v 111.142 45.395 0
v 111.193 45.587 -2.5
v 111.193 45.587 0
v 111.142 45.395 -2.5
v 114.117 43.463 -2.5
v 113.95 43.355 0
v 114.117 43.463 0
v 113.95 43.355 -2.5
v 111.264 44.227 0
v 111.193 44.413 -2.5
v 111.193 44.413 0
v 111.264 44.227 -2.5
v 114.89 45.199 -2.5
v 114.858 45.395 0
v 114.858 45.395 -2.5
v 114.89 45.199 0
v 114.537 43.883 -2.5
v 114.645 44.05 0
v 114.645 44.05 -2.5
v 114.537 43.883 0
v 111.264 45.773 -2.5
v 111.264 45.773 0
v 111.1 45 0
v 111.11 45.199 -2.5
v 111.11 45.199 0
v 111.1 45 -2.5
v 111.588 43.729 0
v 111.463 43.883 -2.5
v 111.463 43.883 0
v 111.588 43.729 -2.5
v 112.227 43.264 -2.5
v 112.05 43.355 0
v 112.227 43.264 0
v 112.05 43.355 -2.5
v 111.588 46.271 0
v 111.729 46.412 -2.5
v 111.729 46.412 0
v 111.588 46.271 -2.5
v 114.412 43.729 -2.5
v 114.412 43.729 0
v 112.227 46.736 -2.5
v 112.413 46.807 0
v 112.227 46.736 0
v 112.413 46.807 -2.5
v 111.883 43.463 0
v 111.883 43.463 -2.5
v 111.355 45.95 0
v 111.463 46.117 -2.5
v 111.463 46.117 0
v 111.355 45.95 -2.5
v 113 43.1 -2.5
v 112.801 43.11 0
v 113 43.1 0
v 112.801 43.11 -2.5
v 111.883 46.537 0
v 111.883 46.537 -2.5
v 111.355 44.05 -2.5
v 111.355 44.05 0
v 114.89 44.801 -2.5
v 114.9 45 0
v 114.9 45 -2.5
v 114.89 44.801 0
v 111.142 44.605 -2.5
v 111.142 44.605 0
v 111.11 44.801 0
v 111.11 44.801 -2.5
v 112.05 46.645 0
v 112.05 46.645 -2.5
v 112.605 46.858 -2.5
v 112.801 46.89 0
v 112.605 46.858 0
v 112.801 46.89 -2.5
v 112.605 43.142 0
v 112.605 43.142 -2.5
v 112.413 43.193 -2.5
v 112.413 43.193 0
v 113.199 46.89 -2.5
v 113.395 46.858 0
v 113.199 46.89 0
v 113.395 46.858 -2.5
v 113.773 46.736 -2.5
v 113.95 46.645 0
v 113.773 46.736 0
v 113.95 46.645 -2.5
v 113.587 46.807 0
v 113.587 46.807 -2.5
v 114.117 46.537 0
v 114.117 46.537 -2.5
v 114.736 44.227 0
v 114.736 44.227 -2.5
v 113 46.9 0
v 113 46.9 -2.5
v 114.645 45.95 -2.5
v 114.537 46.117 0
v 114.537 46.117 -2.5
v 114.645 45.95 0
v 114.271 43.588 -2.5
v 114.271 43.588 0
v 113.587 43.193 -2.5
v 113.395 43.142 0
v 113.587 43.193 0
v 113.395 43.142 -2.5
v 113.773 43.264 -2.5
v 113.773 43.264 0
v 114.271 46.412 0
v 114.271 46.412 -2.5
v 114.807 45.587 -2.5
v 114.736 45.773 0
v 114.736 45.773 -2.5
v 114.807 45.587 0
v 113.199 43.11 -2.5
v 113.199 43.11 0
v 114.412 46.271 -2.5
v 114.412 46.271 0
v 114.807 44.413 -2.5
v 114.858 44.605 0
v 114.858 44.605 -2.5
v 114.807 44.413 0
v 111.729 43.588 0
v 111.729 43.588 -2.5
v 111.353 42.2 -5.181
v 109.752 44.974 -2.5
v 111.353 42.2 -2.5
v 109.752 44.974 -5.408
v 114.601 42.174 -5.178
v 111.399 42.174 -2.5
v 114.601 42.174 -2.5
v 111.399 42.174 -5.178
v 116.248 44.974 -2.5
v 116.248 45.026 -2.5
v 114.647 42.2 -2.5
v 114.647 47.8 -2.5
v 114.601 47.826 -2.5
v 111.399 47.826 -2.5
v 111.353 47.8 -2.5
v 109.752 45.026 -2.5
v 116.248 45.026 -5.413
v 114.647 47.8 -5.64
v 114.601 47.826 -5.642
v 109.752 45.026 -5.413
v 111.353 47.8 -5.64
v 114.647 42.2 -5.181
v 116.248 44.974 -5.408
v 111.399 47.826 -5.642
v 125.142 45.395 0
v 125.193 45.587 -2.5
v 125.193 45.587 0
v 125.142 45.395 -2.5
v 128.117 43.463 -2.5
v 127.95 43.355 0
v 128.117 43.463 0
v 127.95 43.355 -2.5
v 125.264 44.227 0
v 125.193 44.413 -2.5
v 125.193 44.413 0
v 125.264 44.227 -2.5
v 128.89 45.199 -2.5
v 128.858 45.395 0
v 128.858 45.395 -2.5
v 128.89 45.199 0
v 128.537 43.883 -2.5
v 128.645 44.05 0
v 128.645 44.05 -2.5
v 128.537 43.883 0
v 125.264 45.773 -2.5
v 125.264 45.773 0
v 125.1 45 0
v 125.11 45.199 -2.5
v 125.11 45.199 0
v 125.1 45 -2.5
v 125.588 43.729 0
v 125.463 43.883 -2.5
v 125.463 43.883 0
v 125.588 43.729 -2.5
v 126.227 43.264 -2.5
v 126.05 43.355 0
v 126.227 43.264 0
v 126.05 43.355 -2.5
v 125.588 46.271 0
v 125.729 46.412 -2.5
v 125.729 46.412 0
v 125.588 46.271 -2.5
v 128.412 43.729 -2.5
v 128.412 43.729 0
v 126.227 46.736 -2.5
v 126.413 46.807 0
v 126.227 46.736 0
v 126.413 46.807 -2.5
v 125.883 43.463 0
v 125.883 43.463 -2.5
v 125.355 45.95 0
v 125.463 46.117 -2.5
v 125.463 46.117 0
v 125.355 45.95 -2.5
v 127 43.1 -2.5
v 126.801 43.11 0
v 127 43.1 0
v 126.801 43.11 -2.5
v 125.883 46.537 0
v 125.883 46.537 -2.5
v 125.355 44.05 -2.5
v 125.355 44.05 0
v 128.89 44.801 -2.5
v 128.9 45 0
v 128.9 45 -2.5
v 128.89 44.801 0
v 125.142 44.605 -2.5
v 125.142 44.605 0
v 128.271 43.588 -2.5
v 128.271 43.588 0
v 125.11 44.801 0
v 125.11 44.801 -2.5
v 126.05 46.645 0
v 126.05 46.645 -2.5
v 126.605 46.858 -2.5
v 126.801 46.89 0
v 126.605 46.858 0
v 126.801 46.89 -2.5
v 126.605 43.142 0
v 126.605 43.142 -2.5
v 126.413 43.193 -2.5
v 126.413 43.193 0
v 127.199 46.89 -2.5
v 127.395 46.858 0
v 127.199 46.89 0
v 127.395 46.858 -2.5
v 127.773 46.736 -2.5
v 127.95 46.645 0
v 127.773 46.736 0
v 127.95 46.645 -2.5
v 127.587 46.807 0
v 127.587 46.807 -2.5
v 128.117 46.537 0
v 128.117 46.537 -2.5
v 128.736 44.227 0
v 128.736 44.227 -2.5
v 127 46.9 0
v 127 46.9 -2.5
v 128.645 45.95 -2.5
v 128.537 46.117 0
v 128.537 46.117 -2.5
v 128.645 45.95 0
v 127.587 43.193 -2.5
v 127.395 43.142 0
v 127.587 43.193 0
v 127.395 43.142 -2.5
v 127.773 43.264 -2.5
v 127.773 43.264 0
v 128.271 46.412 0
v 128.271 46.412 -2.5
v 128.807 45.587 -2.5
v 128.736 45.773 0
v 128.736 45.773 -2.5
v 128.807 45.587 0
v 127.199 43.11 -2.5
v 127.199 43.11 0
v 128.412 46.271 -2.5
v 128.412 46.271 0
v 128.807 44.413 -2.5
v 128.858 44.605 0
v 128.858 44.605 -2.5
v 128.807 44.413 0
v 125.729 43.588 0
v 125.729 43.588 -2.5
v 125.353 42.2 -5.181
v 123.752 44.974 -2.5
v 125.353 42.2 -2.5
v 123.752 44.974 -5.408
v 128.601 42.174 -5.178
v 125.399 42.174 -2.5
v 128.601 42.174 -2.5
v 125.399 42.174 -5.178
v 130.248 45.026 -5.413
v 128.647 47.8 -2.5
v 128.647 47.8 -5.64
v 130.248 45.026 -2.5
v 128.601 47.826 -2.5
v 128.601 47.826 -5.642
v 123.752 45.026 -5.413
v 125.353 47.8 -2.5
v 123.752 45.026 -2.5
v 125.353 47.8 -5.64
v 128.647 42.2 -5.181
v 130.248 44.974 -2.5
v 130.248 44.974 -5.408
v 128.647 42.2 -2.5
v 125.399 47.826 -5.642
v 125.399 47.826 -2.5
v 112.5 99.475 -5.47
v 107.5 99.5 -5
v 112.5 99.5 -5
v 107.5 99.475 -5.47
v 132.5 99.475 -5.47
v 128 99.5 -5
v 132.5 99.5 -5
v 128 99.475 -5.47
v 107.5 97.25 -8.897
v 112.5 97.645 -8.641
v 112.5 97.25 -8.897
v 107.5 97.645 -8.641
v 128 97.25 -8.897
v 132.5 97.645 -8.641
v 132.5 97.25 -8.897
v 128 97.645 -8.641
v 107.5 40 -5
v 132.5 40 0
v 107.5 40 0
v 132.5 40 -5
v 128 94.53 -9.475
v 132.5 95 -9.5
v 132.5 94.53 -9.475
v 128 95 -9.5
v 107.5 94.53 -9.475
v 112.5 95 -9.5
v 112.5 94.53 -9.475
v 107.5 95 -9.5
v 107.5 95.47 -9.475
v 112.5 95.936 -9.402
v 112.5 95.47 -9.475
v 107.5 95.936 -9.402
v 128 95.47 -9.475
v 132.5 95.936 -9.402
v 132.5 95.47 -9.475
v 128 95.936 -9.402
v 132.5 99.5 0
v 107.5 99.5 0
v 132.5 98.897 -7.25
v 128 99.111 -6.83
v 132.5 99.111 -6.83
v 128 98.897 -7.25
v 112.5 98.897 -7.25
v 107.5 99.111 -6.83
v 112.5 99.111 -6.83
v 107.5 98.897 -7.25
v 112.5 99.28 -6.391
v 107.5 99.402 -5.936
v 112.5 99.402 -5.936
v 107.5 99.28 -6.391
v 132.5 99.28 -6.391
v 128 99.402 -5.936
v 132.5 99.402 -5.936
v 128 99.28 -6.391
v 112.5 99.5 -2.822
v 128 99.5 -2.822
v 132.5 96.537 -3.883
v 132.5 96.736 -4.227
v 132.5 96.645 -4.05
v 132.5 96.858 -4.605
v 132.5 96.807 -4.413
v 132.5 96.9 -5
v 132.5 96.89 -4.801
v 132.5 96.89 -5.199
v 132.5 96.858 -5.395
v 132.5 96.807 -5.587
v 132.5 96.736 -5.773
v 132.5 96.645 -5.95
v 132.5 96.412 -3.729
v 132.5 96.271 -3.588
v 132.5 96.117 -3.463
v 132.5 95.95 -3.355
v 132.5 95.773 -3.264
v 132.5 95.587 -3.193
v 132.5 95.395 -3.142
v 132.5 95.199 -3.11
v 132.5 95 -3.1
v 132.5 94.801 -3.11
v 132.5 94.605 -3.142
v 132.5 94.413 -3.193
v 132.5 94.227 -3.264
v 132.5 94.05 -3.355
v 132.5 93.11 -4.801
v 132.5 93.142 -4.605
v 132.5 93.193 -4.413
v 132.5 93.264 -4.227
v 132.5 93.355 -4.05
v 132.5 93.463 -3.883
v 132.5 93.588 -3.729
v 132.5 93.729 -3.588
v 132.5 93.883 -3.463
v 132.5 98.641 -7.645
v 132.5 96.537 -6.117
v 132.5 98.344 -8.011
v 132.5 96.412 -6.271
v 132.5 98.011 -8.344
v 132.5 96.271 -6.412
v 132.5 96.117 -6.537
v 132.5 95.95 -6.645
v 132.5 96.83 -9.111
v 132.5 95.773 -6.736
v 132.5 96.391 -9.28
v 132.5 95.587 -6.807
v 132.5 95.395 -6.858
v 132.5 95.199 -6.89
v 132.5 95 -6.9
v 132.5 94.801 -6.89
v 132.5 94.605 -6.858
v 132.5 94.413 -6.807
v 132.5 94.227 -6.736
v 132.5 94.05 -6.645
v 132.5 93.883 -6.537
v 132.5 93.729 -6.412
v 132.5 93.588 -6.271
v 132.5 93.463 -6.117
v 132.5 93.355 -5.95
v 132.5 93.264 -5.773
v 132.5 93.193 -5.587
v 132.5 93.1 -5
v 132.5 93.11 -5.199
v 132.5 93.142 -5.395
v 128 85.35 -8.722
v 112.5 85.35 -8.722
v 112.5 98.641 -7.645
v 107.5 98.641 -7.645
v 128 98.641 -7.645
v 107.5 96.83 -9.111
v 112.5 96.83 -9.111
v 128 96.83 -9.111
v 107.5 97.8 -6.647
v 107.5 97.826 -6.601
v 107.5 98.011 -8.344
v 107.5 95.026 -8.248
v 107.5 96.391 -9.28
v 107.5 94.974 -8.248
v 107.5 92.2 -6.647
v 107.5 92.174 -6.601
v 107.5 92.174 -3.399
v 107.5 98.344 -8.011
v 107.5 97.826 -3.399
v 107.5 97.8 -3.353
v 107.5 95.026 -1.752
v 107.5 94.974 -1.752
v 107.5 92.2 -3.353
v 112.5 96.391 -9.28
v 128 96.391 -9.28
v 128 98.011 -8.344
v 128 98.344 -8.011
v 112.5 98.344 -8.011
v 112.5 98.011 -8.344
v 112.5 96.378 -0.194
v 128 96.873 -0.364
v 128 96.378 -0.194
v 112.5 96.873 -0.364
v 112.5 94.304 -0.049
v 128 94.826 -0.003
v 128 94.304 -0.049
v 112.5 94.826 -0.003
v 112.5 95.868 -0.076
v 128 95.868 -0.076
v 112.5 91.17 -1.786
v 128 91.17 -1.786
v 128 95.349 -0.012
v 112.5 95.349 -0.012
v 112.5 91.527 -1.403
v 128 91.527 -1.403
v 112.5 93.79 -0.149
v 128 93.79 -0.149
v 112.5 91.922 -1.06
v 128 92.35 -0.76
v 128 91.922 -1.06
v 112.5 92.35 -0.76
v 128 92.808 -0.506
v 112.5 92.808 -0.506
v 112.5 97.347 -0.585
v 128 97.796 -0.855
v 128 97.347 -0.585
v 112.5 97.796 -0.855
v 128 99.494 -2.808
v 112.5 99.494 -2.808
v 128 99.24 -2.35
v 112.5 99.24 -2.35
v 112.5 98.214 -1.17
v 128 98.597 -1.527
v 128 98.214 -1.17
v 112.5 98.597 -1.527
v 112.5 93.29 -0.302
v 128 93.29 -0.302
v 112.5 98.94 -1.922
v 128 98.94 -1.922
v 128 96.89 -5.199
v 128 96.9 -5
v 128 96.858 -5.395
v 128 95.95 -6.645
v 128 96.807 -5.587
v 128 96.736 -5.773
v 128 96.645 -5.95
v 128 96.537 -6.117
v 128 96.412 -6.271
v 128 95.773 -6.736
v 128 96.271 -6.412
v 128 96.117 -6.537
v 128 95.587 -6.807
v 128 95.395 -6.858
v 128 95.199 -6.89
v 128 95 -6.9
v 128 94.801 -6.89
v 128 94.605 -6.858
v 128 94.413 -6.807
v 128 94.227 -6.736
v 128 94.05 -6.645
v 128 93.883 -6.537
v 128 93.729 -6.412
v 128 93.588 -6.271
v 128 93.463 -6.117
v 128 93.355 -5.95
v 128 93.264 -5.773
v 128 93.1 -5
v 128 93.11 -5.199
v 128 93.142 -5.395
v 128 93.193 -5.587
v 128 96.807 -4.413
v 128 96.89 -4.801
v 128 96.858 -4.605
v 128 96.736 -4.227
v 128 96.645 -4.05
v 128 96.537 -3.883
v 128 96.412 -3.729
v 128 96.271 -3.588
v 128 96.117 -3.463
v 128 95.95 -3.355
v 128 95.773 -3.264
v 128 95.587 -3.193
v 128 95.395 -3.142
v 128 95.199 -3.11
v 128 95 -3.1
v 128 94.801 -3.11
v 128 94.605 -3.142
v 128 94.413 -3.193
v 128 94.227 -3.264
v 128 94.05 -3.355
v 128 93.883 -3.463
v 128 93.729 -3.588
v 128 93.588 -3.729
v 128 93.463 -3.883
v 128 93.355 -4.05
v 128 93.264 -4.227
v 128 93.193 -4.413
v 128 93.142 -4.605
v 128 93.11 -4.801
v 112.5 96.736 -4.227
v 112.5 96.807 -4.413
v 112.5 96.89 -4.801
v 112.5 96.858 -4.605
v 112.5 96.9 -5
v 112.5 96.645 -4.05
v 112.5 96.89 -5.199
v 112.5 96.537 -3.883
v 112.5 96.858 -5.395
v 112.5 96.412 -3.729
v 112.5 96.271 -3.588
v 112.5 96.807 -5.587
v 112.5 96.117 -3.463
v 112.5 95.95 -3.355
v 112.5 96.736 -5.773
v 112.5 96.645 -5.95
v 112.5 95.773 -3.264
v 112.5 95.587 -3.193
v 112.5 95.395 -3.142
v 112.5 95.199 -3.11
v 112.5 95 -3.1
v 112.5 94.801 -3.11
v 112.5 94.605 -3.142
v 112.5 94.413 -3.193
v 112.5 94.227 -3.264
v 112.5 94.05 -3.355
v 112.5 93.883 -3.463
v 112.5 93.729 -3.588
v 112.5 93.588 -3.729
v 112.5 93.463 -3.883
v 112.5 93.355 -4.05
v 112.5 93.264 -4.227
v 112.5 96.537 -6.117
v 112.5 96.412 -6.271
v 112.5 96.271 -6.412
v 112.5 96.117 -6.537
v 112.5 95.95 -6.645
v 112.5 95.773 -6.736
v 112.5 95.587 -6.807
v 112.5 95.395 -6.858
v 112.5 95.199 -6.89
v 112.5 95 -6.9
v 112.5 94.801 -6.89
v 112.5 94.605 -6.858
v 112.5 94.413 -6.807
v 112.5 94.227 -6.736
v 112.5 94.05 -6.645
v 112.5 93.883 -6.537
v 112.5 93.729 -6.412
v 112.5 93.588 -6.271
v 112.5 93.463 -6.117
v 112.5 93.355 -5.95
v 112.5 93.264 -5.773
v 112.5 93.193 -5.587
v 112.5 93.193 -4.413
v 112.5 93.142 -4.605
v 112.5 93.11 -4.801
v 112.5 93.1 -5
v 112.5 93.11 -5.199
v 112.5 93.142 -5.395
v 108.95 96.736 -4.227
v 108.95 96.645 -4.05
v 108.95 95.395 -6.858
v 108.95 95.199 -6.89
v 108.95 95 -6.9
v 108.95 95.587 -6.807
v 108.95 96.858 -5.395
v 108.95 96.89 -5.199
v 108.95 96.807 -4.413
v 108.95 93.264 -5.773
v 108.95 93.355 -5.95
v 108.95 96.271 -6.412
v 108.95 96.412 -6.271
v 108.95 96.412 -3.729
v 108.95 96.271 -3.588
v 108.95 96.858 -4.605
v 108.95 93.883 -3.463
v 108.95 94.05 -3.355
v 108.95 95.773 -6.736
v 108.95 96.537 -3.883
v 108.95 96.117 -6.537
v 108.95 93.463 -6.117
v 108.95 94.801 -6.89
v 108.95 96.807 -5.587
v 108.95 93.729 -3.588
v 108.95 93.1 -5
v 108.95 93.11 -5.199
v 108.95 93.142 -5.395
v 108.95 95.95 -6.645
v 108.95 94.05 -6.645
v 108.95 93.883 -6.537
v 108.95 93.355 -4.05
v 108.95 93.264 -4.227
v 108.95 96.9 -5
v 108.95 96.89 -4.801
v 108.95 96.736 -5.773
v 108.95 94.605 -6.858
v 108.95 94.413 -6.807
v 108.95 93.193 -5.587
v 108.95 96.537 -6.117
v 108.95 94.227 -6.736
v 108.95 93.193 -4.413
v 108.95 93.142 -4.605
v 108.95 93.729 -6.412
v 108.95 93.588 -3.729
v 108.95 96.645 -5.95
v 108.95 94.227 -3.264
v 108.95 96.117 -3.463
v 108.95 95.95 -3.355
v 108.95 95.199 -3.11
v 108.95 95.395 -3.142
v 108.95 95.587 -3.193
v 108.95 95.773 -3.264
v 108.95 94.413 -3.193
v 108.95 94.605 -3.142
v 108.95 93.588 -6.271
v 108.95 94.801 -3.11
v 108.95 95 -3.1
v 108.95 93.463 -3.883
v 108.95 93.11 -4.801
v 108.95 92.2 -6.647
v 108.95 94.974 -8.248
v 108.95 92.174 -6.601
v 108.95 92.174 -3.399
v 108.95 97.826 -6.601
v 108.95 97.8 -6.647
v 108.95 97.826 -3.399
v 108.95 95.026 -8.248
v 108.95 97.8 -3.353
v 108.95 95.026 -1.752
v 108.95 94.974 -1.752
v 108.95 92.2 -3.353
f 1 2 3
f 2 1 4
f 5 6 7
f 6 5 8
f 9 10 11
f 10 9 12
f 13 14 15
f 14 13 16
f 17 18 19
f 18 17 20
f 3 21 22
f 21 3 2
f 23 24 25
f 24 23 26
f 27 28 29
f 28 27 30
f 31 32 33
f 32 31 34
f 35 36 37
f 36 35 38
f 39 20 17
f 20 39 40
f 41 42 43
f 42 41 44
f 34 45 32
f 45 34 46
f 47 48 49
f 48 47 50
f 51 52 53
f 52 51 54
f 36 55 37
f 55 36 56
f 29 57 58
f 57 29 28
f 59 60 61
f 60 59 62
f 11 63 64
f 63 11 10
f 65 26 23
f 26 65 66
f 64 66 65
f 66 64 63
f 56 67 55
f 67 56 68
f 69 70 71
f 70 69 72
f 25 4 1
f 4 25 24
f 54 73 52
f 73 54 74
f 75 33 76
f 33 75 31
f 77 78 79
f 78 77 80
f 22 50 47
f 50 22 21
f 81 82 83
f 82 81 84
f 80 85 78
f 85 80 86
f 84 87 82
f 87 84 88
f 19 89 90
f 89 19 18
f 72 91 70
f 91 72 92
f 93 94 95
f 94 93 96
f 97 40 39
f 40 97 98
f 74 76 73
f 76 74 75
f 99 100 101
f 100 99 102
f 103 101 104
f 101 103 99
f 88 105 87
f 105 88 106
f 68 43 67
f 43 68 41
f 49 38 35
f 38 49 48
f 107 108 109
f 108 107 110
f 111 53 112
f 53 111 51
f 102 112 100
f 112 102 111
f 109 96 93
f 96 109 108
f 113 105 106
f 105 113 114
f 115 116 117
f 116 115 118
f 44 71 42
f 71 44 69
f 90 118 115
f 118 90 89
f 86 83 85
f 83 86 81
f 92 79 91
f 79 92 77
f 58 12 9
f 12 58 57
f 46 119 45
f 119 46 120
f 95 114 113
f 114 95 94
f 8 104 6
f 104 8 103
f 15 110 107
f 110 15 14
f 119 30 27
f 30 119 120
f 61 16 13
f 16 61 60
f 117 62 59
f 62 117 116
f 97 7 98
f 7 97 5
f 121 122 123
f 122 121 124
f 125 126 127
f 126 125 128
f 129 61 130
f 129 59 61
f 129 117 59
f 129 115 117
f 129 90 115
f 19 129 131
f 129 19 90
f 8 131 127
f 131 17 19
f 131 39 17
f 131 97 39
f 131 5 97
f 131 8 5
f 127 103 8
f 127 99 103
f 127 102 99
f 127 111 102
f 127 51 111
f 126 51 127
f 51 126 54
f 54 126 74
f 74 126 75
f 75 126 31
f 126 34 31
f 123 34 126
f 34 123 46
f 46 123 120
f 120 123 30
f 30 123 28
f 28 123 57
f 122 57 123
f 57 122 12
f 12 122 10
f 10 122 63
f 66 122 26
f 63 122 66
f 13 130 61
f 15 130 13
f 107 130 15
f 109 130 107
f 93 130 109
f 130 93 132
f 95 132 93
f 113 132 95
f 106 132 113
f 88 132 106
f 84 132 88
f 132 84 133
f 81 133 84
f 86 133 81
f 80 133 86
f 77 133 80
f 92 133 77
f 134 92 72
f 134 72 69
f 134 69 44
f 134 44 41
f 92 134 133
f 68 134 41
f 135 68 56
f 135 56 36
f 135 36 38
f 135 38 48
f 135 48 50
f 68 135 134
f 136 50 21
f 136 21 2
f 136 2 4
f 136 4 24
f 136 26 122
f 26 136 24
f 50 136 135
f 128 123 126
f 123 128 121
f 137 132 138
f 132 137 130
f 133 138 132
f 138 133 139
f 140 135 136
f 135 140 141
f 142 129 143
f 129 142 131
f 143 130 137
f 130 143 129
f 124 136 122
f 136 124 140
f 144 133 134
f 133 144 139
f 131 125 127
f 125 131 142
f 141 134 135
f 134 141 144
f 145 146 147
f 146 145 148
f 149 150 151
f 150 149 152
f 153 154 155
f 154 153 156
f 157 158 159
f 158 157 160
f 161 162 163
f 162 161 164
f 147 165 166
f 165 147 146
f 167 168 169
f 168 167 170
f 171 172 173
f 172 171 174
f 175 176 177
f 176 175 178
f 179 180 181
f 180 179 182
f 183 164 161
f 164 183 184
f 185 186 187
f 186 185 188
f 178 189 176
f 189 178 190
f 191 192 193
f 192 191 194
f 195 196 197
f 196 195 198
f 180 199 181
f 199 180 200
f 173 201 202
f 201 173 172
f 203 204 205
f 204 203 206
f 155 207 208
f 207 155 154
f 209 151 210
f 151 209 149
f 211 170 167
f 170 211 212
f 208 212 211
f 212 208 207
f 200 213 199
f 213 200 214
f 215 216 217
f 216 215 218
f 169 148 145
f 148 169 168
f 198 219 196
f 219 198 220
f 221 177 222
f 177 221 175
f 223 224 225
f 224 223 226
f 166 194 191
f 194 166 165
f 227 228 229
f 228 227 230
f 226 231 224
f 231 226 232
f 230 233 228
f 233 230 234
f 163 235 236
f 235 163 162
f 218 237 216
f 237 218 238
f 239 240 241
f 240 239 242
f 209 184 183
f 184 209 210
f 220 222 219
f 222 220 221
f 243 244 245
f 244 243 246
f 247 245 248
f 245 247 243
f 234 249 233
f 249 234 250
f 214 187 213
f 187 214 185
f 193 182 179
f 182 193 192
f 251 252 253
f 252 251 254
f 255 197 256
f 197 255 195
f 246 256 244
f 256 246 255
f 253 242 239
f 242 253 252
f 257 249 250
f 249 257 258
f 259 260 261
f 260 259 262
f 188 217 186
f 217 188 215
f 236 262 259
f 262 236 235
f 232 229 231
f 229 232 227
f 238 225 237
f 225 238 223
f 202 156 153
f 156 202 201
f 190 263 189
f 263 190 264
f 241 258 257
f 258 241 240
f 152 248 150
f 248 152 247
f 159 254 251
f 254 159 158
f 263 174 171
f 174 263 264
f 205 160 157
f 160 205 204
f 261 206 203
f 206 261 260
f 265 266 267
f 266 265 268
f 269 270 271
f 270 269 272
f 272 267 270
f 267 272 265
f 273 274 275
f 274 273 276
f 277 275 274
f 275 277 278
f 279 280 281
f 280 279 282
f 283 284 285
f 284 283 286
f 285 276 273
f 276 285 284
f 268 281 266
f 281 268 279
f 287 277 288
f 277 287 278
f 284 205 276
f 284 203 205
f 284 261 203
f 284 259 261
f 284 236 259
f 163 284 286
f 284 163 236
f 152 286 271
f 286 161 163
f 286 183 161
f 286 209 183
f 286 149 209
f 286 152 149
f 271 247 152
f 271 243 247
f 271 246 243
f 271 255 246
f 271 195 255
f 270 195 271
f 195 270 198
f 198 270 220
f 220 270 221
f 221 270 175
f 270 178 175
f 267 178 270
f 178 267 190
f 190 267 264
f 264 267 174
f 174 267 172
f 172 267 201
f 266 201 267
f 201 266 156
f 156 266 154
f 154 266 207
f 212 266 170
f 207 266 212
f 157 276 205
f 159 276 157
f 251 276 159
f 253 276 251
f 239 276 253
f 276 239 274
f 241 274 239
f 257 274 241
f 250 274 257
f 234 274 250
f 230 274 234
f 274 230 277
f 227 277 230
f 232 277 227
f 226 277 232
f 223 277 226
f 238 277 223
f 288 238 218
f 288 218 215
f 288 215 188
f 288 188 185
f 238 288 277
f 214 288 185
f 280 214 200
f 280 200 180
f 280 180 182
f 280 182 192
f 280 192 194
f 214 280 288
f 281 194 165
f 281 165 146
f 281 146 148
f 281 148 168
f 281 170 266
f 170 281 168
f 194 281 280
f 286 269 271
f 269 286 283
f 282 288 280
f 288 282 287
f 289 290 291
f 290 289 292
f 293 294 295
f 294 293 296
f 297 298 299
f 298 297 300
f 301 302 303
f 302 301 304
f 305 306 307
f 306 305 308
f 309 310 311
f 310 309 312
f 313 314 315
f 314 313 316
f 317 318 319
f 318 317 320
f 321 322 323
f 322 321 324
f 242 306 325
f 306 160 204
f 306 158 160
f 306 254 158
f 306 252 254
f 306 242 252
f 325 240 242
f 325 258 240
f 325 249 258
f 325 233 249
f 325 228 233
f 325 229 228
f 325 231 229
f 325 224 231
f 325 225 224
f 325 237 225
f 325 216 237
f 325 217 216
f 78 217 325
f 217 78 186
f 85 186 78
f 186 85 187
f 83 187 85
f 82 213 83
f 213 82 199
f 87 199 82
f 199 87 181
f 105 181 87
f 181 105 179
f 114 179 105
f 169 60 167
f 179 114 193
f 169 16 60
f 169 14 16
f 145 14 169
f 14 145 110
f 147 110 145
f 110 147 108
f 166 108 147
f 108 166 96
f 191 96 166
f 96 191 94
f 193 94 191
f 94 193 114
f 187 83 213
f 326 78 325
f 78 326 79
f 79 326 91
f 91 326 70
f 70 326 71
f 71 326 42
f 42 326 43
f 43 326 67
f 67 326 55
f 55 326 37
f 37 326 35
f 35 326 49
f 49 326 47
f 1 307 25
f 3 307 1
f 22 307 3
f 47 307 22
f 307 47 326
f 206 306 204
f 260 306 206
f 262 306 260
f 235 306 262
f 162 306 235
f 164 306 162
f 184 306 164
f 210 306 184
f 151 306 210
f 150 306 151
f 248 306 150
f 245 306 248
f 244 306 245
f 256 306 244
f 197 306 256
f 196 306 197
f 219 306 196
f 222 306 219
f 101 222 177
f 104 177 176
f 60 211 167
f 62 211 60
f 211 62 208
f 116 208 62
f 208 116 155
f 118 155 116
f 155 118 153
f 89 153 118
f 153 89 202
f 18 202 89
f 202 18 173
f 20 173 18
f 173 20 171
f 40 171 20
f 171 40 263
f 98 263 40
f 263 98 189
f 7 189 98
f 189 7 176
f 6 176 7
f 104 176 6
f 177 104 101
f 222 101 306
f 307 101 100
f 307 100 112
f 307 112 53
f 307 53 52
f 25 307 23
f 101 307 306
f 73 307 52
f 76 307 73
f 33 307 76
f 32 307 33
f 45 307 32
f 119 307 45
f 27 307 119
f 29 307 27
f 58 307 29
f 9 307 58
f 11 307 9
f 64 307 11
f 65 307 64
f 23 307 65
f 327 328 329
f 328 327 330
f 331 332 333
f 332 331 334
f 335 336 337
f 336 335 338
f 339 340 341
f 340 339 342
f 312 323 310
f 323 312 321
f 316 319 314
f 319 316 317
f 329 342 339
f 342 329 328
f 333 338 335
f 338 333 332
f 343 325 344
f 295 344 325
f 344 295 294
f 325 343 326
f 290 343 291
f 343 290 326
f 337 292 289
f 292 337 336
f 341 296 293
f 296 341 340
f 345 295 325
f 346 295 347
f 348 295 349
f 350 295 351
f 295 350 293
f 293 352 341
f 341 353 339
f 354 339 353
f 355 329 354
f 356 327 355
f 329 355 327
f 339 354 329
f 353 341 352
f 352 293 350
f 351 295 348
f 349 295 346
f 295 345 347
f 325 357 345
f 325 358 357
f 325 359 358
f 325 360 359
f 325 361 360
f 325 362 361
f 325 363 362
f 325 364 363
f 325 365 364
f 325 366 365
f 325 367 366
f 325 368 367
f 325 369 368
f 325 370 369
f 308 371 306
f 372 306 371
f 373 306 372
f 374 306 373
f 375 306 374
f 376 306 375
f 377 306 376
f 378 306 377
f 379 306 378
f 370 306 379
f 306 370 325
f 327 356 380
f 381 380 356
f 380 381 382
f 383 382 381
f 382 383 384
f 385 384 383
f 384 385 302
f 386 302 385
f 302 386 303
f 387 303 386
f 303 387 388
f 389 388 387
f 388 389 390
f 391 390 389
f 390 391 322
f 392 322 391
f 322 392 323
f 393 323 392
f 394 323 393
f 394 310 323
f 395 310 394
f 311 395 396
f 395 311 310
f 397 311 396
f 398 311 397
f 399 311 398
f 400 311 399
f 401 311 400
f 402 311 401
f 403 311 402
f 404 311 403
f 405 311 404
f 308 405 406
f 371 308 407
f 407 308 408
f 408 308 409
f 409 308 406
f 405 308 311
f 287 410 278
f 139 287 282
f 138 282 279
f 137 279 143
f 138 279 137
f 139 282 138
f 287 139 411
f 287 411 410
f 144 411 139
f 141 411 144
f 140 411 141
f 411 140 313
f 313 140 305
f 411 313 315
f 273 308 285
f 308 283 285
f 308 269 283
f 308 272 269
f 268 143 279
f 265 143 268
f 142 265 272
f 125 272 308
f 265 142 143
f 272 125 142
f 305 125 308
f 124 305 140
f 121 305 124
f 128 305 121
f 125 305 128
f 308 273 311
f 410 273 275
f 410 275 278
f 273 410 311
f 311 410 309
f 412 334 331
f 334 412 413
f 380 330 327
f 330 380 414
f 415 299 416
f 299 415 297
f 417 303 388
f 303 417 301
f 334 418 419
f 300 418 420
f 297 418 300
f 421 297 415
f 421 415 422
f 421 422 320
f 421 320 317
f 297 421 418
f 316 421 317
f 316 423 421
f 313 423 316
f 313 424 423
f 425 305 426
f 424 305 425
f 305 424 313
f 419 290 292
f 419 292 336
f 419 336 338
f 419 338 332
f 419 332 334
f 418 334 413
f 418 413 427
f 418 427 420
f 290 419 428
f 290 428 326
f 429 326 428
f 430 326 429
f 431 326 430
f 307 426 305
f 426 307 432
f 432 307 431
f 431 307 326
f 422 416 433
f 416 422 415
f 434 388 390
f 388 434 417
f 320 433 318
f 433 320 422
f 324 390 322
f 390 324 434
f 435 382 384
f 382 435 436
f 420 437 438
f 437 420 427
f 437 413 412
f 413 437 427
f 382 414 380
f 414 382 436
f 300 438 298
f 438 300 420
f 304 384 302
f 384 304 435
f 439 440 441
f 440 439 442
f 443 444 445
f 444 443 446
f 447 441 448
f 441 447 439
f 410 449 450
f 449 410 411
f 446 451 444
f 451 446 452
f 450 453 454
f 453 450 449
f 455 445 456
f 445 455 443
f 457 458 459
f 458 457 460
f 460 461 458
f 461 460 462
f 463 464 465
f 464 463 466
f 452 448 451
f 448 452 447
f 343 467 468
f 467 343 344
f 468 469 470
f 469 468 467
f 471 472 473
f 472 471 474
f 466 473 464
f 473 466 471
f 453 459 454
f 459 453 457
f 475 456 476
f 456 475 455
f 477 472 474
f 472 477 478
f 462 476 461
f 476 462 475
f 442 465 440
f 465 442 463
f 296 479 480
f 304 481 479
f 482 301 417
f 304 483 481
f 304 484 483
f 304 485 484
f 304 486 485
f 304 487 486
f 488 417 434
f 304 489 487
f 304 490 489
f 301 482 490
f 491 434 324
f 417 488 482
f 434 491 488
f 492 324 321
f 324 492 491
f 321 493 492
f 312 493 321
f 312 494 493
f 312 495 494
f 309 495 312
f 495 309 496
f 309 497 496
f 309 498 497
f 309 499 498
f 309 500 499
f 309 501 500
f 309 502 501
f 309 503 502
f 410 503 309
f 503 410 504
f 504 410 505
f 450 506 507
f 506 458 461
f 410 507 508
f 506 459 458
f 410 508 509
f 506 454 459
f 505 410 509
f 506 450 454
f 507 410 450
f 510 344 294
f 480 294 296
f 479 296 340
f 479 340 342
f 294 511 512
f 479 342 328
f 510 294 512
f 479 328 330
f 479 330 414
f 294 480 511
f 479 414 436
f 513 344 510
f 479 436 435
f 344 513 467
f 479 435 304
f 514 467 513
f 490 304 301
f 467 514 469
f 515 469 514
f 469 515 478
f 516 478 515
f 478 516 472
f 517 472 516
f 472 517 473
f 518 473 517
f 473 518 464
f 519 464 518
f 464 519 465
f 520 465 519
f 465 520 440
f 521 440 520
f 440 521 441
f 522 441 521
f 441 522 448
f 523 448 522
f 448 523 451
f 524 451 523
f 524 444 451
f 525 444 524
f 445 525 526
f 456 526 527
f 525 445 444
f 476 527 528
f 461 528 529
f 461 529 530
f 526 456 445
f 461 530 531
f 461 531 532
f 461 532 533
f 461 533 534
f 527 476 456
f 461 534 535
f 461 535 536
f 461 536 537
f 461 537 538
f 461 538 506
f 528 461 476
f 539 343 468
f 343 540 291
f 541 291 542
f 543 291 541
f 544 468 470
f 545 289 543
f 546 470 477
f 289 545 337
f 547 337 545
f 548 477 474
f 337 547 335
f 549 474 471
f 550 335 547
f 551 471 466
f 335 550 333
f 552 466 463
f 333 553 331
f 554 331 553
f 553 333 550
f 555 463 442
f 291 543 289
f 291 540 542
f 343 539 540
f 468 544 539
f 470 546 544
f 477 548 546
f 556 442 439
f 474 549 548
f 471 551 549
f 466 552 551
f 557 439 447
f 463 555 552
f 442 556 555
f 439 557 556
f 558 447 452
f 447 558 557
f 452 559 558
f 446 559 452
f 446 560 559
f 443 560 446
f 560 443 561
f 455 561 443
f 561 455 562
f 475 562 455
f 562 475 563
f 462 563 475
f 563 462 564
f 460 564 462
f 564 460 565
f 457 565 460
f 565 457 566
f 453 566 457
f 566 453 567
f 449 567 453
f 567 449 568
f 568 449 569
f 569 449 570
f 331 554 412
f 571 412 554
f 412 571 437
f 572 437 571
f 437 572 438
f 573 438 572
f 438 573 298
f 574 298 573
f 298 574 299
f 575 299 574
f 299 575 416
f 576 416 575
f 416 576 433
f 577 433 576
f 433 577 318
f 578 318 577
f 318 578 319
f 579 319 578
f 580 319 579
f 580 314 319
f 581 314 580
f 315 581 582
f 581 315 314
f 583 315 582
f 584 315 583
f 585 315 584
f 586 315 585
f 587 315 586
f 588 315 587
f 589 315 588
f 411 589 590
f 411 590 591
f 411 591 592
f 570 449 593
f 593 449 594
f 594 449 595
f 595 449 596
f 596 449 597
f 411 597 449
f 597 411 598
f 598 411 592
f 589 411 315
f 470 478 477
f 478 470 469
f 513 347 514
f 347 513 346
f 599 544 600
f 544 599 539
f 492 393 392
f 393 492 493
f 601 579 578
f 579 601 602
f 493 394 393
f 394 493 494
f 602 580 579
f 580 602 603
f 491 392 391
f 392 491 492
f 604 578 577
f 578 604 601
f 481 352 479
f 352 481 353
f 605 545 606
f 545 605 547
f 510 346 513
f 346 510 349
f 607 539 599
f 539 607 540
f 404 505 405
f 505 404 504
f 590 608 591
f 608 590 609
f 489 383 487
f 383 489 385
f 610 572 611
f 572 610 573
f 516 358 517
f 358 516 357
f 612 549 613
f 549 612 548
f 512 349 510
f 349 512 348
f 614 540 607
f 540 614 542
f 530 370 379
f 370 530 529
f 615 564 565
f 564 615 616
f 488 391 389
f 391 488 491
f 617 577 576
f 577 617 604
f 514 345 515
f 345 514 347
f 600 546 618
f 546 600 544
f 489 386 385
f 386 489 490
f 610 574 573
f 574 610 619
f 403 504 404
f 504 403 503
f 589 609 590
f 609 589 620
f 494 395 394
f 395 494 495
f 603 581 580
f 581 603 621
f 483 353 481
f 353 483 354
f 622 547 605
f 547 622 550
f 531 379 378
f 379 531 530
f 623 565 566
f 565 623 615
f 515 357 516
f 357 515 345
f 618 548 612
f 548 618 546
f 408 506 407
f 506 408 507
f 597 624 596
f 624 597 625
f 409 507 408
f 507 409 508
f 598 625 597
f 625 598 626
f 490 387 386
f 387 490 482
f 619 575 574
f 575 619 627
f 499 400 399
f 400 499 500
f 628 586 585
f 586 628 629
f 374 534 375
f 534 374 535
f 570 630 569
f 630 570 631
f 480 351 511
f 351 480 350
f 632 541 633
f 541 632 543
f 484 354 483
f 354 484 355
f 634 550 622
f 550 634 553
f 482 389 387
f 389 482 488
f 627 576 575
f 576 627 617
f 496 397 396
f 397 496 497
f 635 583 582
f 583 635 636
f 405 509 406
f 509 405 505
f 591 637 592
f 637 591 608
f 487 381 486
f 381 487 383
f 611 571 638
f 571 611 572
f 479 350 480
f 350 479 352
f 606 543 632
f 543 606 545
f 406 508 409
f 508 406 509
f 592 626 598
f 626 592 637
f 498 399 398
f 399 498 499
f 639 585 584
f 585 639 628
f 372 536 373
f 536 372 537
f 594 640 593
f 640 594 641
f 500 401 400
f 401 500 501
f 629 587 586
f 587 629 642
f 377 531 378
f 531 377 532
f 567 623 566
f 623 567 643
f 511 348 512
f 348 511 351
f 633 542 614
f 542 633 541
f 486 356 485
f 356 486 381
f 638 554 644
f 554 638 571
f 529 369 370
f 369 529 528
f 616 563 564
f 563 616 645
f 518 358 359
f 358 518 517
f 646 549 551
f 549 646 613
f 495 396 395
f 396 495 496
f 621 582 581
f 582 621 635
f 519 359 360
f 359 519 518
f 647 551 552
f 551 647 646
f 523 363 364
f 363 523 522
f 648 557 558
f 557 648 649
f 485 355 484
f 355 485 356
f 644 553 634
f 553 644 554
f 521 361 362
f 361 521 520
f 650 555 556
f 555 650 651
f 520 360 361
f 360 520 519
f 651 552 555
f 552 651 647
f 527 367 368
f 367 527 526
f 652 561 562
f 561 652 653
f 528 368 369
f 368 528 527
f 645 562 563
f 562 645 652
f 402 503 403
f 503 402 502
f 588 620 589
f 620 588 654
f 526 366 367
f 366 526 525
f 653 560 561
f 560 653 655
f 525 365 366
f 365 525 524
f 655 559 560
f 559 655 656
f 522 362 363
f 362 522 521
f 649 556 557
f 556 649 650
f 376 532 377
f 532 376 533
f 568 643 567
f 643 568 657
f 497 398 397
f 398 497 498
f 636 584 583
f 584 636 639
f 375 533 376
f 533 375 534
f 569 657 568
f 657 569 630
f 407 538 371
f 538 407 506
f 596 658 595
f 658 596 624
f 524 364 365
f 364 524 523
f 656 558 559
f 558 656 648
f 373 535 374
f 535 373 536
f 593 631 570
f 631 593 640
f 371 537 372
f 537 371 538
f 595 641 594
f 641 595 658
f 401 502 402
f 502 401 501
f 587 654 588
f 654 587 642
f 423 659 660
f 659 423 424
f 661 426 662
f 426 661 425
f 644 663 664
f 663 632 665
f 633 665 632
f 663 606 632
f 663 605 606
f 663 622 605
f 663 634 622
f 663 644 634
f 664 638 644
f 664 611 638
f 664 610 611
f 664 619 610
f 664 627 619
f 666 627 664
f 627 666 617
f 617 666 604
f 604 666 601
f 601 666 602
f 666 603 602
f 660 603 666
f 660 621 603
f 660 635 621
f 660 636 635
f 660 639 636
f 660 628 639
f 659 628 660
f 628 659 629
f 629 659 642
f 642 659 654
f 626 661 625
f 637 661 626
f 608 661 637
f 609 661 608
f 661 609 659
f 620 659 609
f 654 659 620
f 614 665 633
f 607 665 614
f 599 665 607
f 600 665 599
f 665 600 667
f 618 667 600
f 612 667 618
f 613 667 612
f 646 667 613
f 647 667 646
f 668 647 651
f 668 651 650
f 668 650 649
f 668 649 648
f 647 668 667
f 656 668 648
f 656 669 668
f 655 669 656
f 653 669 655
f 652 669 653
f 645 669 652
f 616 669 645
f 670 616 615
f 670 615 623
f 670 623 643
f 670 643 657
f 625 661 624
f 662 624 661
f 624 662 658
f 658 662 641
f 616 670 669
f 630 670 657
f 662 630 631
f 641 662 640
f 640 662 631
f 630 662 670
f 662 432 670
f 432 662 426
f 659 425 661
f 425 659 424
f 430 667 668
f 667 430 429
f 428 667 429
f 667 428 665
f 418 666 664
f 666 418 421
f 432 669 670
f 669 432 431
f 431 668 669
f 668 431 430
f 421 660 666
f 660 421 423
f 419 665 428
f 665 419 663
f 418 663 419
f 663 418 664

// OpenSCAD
// file: fhex.scad
m3_hex_nut=5.6;
m3_nut_height=2.25;
m4_hex_nut=7.2;
m4_nut_height=2.9;
m5_hex_nut=7.8;
m5_nut_height=3.9;

module fhex(wid,height){
  hull(){
    cube([wid/1.7,wid,height],center=true);
    rotate([0,0,120]) cube([wid/1.7,wid,height], center=true);
    rotate([0,0,240]) cube([wid/1.7,wid,height], center=true);
  }
}
// main file
$fn=60;
sfn=30;
fudge=0.3;
side_spacing=248;
panel_height=284;
panel_width=256;
thickness=3.5;
include <fhex.scad>

//handle();
//door();
//translate([35,0,3]) test_template();
//translate([0,0,-1]) side_panel_test();


//top_side_support();

//for(Z=[-1,1]) translate([0,0,-145*Z]) rotate([90,0,0]) 
//    mirror([0,1-Z,0]) side_panel_support();
//for(X=[-1,1]) 
//translate([side_spacing/2*X,0,0]) mirror([1-X,0,0])
//    vertical_side_panel_support();
//translate([-234/2,-180,0])
//rotate([90,0,0])
//door_assembly();
//for(X=[-1,1])
//translate([175*X,0,0])
//rotate([0,0,90*X]) side_assembly();
//for(X=[-1,1]) translate([124*X,0,0]) rotate([90,90,0]) vert_test(width=294);

//translate([-141,11,0]) import("../printer/camera-mount.stl");

translate([107.5,60+35,-5]) rotate([0,90,0]) door_camera_mount(height=35);
//top_enclosure();
//test_template2();
    
module export_door(){
    projection(cut = true) rotate([0,0,0]) door();
}

module door(){
    difference(){
        translate([120,0,0]) 
        hull() for(X=[-1,1], Y=[-1,1]){
            translate([((265/2)-2.5)*X,((295/2)-2.5)*Y,0]) cylinder(d=5, h=thickness);
        }
        
        for(Y=[-92.5,-67.5,67.5,92.5]) translate([0, Y, 0])
            cylinder(d=4.2+fudge, h=10, center=true); 
        for(X=[224,233]) translate([X, 0, 0])
            cylinder(d=4.2+fudge, h=10, center=true);
        translate([120,45,0])
            for(X=[-1,1]) translate([7*X,0,-1]) 
                cylinder(d=3.8, h=thickness+2);
    }
}

module export_side_panel(){
    projection(cut = true) rotate([90,0,0]) side_panel();
}

module top_enclosure(){
    width=294;
    depth=294;
    height=152;
    translate([0,0,height/2]) 
        %cube([width, depth, height], center=true);
    
}

module door_camera_mount(down_tilt=40, height=0){
    difference(){
        union(){
            hull(){
                cylinder(d=9, h=25);
                translate([-5,-4.5,0]) cube([1,9,25]);
                translate([-5,-height-20,0])
                    cube([5,height+20,25]);
            }
        }
        translate([0,0,5]) rotate([0,0,-down_tilt]) hull(){
            cylinder(d=10, h=15.5);
            translate([10,-5,0]) cube([1,10,15.5]);
        }
        translate([0,0,-0.5]) cylinder(d=3.8, h=26);
        translate([0,0,0.7]) fhex(5.6,1.5);
        translate([0,-5,5]) cube([30,10,15.5]);
        
        for(Z=[-7,7]){
            translate([0,-height-15,12.5+Z]) rotate([0,90,0]) 
                cylinder(d=3.8, h=26, center=true);
            translate([0,-height-15,12.5+Z]) rotate([0,90,0]) 
                fhex(m3_hex_nut,5);
        }
    }
}

module camera_mount(height=30){
    difference(){
        union(){
            hull(){
                cylinder(d=9, h=25);
                translate([-5,-4.5,0]) cube([1,9,25]);
                translate([-5,-height-30,0]) cube([5,height+30,25]);
            }
            hull(){
                translate([30,-height-41.5,0]) cube([40,5,25]);
                translate([-5,-height-30,0]) cube([75,5,25]);
            }
            translate([-2,-height,0]) rotate([0,0,-45]) 
                cube([45,5,25]);
        }
        translate([0,0,5]) cylinder(d=10, h=15.5);
        translate([0,0,-0.5]) cylinder(d=3.8, h=26);
        translate([0,0,0.7]) fhex(5.6,1.5);
        translate([0,-5,5]) cube([30,10,15.5]);
        
        translate([48,-height-20,12.5]){
            rotate([90,0,0]) cylinder(d=5, h=26);
            translate([0,-18,0]) rotate([90,0,0]) 
                cylinder(d=6, h=5);
            hull(){
                rotate([90,0,0]) cylinder(d=15, h=10);
                translate([30,-6,0]) cube([1,10,15], center=true);
            }
        }
        for(Z=[5,20]) translate([60,-height-35,Z]) rotate([90,0,0]) 
            cylinder(d=3.3, h=10);
        translate([38,-height-36,-0.5]) cube([33,6,26]);
    }
}

module vert_test(width=293, thickness=1){
    difference(){
        hull() for(X=[-1,1]) translate([width/2*X,0,0]) 
            cylinder(d=10, h=thickness);
        for(X=[-1,1]) translate([width/2*X,0,-1]) 
            cylinder(d=5.2, h=thickness+2);
    }
}

module side_assembly(){
    translate([0,0,5+142]) rotate([90,180,0]) top_side_support();
    %side_panel();
    translate([0,0,-5-142]) rotate([90,0,0]) side_panel_support();
}

module side_panel(){
    difference(){
        translate([0,-thickness/2,0]) 
            cube([panel_width, thickness, panel_height], center=true);
        for(Z=[-1,0,1], X=[-1,1]) 
            translate([((panel_width/2)-5)*X,0,(panel_height/2-20)*Z])
            rotate([90,0,0]) 
            cylinder(d=3.2+fudge, h=40, center=true);
    }
//    for(Z=[-1,0,1], X=[-1,1]) 
//        translate([((panel_width/2)-5)*X,0,(panel_height/2-20)*Z])
//        rotate([90,0,0]) 
//        %cylinder(d=3.2+fudge, h=40, center=true);
}

module side_panel_test(spacing=side_spacing){
    dia=5;
    thickness=3;
    difference(){
        hull() for(X=[-1,1]) translate([spacing/2*X,0,0]) 
            cylinder(d=5+4, h=thickness);
        for(X=[-1,1]) translate([spacing/2*X,0,-0.5]) 
            cylinder(d=5+fudge, h=thickness*2);
    }
}

module vertical_side_panel_support(dia=20, sep=290){
    difference(){
        hull()
            for(Z=[-1,1]) translate([0,0,sep/2*Z]) 
                sphere(d=dia, $fn=sfn);
        translate([0,dia/2,0])
            cube([dia, dia, sep+dia], center=true);
        translate([-(dia/2)+4.5,-thickness+fudge*4,0])
            cube([dia, thickness+fudge*3, sep+dia], center=true);
        for(Z=[-1,1]){
            translate([dia,-1,sep/2*Z]) rotate([0,-90,0])
                cylinder(d=dia, h=dia*2);
        }
        for(Z=[-1,0,1]){
            translate([-1,0,(panel_height/2-20)*Z])
                rotate([90,0,0]) {
                cylinder(d=3.2+fudge, h=40, center=true);
                translate([0,0,11]) fhex(m3_hex_nut+fudge,10);
            }
        }
    }
}

module top_side_support(){
    hull() for(X=[-1,1], Y=[-20,-30]) 
        translate([-50*X,Y,20]) sphere(d=5, $fn=sfn);
    for(X=[-1,1]) translate([-50*X,0,0]) hull(){
        translate([0,0,2.5]) sphere(d=5, $fn=sfn);
        translate([0,-20,20]) sphere(d=5, $fn=sfn);
        translate([0,-30,2.5]) sphere(d=5, $fn=sfn);
        translate([0,-30,20]) sphere(d=5, $fn=sfn);
    }
    hull() for(X=[-1,1]){
        translate([50*X,-30,2.5]) sphere(d=5, $fn=sfn);
        translate([115*X,0,2.5]) sphere(d=5, $fn=sfn);
    }
    hull() for(X=[-1,1], Z=[2.5,20]) 
        translate([-50*X,-30,Z]) sphere(d=5, $fn=sfn);
    side_panel_support(dia=20);
    
}

module side_panel_support(dia=20){
    difference(){
        hull()
            for(X=[-1,1]) translate([side_spacing/2*X,0,0]) 
                sphere(d=dia, $fn=sfn);
        translate([0,0,-dia/2])
            cube([side_spacing+dia, dia, dia], center=true);
        translate([0,(dia/2)+4.5,(thickness/2)-fudge])
            cube([side_spacing+dia, dia, thickness+fudge*3], center=true);
        for(X=[-1,1]){
            translate([side_spacing/2*X,0,-0.5])
                cylinder(d=5+fudge, h=dia);
            translate([side_spacing/2*X,0,dia/4])
                cylinder(d=dia, h=dia);
        }
    }
}

module handle(){
    curve=75;
    difference(){
        union(){
            hull() for(X=[0,16]) translate([X,0,0])
            cylinder(d=15, h=15);
            translate([8,0,12])
            intersection(){
                translate([0,0,curve/2]) 
                    sphere(d=curve, $fn=300);
                cylinder(d=35, h=5);
            }
        }
        for(X=[-2, 7]) translate([X,0,-10]) screw_cutout(20);
        translate([16,0,-0.01]){
            %magnet();
            cylinder(d=11.1125+fudge, h=4.7625);
        }
    }
    
}

module test_template2(thickness=3.2){
//    265
    difference(){
        union(){
            hull() for(Y=[-1,1], X=[-1,0])
                translate([8*X,185/2*Y,0]) 
                cylinder(d=10, h=thickness);
            translate([227, 0, 0])
            hull() for(X=[0,15]) translate([X,0,0]) cylinder(d=15, h=thickness);
            for(Y=[-1,1])
            hull(){
                translate([0,185/2*Y,0]) cylinder(d=5, h=3);
                translate([227,0,0]) cylinder(d=5, h=3);
            }
            translate([265/2-12.5,45,0])
            hull() for(X=[-1,1])
            translate([7*X,0,0]) cylinder(d=10, h=thickness);
        }
        for(Y=[-92.5,-67.5,67.5,92.5]) translate([0, Y, 0])
            cylinder(d=4.2+fudge, h=10, center=true); 
        for(X=[224,233]) translate([X, 0, 0])
            cylinder(d=4.2+fudge, h=10, center=true);
        translate([227+15, 0, 2.9])
            cylinder(d=11.1125+fudge, h=thickness);
        translate([120,45,0])
            for(X=[-1,1])
            translate([7*X,0,-1]) cylinder(d=3.8, h=thickness+2);
    }
}

module test_template(thickness=3.2){
    translate([-27,0,-6.5])
    difference(){
        union(){
            hull() for(Y=[-1,1], X=[-1,0])
                translate([8*X,185/2*Y,0]) 
                cylinder(d=10, h=thickness);
            translate([227, 0, 0])
            hull() for(X=[0,15]) translate([X,0,0]) cylinder(d=15, h=thickness);
            for(Y=[-1,1])
            hull(){
                translate([0,185/2*Y,0]) cylinder(d=5, h=3);
                translate([227,0,0]) cylinder(d=5, h=3);
            }
        }
        for(Y=[-92.5,-67.5,67.5,92.5]) translate([0, Y, 0])
            cylinder(d=4.2+fudge, h=10, center=true); 
        for(X=[224,233]) translate([X, 0, 0])
            cylinder(d=4.2+fudge, h=10, center=true);
        translate([227+15, 0, 2.9])
            cylinder(d=11.1125+fudge, h=thickness);
    }
}

module magnet(){
    cylinder(d=11.1125, h=4.7625);
}

module door_assembly(){
    width=234;
    translate([35,0,0]) test_template();
    translate([8,0,-thickness]) %door();
    translate([width,0,0]) handle();
    for(Y=[-80,80]){
        translate([-7,Y,0])
        rotate([0,0,270]){
            hinge(offset=3);
            moving_hinge();
        }
    }
//    translate([122.5,0,0]) %cube([245, 295, 1], center=true);
//    for(Y=[-1,1]) %translate([-12,135/2*Y,0]) cylinder(d=3, h=20, center=true);
}

module moving_hinge(){
    translate([0,10,0]) rotate([0,0,180]) hinge(nut=false);
}

module screw_cutout(length=5){
    translate([0,0,-0.2]) cylinder(d=4.2+fudge, h=length);
    translate([0,0,length-0.21]) 
        cylinder(d1=4.2+fudge, d2=m4_hex_nut+fudge, h=m4_nut_height);
    translate([0,0,length+m4_nut_height-0.211]) 
        cylinder(d=m4_hex_nut+fudge, h=length);
}

module hinge(hole_center=25, height=30, offset=0, nut=true){
    diameter=5;
    
    difference(){
        union(){
            hull() translate([0,-5,-offset])
            for(X=[-1,1], Y=[-1,1]) 
                translate([height/2*X, 3.75*Y, 0]) 
                cylinder(d=5, h=3+offset);
            hull(){
                translate([0,5,5]) rotate([0,90,0]) 
                    cylinder(d=10, h=(height+diameter)/2);
                translate([0,-5,0])
                cube([(height+diameter)/2,10,0.1]);
            }
        }
        for(X=[-1,1]) translate([hole_center/2*X, -5, -5-offset])
            screw_cutout(5+offset);
        translate([-2,5,5]) rotate([0,90,0])
            cylinder(d=3.3+fudge, h=height);
        if(nut){
            translate([1,5,5]) rotate([0,90,0]) 
                fhex(m3_hex_nut+fudge,m3_nut_height);
        }
        translate([-(height/2)-diameter,5,5])
            rotate([0,90,0])
            cylinder(d=11, h=(height/2)+diameter);
    }
}
